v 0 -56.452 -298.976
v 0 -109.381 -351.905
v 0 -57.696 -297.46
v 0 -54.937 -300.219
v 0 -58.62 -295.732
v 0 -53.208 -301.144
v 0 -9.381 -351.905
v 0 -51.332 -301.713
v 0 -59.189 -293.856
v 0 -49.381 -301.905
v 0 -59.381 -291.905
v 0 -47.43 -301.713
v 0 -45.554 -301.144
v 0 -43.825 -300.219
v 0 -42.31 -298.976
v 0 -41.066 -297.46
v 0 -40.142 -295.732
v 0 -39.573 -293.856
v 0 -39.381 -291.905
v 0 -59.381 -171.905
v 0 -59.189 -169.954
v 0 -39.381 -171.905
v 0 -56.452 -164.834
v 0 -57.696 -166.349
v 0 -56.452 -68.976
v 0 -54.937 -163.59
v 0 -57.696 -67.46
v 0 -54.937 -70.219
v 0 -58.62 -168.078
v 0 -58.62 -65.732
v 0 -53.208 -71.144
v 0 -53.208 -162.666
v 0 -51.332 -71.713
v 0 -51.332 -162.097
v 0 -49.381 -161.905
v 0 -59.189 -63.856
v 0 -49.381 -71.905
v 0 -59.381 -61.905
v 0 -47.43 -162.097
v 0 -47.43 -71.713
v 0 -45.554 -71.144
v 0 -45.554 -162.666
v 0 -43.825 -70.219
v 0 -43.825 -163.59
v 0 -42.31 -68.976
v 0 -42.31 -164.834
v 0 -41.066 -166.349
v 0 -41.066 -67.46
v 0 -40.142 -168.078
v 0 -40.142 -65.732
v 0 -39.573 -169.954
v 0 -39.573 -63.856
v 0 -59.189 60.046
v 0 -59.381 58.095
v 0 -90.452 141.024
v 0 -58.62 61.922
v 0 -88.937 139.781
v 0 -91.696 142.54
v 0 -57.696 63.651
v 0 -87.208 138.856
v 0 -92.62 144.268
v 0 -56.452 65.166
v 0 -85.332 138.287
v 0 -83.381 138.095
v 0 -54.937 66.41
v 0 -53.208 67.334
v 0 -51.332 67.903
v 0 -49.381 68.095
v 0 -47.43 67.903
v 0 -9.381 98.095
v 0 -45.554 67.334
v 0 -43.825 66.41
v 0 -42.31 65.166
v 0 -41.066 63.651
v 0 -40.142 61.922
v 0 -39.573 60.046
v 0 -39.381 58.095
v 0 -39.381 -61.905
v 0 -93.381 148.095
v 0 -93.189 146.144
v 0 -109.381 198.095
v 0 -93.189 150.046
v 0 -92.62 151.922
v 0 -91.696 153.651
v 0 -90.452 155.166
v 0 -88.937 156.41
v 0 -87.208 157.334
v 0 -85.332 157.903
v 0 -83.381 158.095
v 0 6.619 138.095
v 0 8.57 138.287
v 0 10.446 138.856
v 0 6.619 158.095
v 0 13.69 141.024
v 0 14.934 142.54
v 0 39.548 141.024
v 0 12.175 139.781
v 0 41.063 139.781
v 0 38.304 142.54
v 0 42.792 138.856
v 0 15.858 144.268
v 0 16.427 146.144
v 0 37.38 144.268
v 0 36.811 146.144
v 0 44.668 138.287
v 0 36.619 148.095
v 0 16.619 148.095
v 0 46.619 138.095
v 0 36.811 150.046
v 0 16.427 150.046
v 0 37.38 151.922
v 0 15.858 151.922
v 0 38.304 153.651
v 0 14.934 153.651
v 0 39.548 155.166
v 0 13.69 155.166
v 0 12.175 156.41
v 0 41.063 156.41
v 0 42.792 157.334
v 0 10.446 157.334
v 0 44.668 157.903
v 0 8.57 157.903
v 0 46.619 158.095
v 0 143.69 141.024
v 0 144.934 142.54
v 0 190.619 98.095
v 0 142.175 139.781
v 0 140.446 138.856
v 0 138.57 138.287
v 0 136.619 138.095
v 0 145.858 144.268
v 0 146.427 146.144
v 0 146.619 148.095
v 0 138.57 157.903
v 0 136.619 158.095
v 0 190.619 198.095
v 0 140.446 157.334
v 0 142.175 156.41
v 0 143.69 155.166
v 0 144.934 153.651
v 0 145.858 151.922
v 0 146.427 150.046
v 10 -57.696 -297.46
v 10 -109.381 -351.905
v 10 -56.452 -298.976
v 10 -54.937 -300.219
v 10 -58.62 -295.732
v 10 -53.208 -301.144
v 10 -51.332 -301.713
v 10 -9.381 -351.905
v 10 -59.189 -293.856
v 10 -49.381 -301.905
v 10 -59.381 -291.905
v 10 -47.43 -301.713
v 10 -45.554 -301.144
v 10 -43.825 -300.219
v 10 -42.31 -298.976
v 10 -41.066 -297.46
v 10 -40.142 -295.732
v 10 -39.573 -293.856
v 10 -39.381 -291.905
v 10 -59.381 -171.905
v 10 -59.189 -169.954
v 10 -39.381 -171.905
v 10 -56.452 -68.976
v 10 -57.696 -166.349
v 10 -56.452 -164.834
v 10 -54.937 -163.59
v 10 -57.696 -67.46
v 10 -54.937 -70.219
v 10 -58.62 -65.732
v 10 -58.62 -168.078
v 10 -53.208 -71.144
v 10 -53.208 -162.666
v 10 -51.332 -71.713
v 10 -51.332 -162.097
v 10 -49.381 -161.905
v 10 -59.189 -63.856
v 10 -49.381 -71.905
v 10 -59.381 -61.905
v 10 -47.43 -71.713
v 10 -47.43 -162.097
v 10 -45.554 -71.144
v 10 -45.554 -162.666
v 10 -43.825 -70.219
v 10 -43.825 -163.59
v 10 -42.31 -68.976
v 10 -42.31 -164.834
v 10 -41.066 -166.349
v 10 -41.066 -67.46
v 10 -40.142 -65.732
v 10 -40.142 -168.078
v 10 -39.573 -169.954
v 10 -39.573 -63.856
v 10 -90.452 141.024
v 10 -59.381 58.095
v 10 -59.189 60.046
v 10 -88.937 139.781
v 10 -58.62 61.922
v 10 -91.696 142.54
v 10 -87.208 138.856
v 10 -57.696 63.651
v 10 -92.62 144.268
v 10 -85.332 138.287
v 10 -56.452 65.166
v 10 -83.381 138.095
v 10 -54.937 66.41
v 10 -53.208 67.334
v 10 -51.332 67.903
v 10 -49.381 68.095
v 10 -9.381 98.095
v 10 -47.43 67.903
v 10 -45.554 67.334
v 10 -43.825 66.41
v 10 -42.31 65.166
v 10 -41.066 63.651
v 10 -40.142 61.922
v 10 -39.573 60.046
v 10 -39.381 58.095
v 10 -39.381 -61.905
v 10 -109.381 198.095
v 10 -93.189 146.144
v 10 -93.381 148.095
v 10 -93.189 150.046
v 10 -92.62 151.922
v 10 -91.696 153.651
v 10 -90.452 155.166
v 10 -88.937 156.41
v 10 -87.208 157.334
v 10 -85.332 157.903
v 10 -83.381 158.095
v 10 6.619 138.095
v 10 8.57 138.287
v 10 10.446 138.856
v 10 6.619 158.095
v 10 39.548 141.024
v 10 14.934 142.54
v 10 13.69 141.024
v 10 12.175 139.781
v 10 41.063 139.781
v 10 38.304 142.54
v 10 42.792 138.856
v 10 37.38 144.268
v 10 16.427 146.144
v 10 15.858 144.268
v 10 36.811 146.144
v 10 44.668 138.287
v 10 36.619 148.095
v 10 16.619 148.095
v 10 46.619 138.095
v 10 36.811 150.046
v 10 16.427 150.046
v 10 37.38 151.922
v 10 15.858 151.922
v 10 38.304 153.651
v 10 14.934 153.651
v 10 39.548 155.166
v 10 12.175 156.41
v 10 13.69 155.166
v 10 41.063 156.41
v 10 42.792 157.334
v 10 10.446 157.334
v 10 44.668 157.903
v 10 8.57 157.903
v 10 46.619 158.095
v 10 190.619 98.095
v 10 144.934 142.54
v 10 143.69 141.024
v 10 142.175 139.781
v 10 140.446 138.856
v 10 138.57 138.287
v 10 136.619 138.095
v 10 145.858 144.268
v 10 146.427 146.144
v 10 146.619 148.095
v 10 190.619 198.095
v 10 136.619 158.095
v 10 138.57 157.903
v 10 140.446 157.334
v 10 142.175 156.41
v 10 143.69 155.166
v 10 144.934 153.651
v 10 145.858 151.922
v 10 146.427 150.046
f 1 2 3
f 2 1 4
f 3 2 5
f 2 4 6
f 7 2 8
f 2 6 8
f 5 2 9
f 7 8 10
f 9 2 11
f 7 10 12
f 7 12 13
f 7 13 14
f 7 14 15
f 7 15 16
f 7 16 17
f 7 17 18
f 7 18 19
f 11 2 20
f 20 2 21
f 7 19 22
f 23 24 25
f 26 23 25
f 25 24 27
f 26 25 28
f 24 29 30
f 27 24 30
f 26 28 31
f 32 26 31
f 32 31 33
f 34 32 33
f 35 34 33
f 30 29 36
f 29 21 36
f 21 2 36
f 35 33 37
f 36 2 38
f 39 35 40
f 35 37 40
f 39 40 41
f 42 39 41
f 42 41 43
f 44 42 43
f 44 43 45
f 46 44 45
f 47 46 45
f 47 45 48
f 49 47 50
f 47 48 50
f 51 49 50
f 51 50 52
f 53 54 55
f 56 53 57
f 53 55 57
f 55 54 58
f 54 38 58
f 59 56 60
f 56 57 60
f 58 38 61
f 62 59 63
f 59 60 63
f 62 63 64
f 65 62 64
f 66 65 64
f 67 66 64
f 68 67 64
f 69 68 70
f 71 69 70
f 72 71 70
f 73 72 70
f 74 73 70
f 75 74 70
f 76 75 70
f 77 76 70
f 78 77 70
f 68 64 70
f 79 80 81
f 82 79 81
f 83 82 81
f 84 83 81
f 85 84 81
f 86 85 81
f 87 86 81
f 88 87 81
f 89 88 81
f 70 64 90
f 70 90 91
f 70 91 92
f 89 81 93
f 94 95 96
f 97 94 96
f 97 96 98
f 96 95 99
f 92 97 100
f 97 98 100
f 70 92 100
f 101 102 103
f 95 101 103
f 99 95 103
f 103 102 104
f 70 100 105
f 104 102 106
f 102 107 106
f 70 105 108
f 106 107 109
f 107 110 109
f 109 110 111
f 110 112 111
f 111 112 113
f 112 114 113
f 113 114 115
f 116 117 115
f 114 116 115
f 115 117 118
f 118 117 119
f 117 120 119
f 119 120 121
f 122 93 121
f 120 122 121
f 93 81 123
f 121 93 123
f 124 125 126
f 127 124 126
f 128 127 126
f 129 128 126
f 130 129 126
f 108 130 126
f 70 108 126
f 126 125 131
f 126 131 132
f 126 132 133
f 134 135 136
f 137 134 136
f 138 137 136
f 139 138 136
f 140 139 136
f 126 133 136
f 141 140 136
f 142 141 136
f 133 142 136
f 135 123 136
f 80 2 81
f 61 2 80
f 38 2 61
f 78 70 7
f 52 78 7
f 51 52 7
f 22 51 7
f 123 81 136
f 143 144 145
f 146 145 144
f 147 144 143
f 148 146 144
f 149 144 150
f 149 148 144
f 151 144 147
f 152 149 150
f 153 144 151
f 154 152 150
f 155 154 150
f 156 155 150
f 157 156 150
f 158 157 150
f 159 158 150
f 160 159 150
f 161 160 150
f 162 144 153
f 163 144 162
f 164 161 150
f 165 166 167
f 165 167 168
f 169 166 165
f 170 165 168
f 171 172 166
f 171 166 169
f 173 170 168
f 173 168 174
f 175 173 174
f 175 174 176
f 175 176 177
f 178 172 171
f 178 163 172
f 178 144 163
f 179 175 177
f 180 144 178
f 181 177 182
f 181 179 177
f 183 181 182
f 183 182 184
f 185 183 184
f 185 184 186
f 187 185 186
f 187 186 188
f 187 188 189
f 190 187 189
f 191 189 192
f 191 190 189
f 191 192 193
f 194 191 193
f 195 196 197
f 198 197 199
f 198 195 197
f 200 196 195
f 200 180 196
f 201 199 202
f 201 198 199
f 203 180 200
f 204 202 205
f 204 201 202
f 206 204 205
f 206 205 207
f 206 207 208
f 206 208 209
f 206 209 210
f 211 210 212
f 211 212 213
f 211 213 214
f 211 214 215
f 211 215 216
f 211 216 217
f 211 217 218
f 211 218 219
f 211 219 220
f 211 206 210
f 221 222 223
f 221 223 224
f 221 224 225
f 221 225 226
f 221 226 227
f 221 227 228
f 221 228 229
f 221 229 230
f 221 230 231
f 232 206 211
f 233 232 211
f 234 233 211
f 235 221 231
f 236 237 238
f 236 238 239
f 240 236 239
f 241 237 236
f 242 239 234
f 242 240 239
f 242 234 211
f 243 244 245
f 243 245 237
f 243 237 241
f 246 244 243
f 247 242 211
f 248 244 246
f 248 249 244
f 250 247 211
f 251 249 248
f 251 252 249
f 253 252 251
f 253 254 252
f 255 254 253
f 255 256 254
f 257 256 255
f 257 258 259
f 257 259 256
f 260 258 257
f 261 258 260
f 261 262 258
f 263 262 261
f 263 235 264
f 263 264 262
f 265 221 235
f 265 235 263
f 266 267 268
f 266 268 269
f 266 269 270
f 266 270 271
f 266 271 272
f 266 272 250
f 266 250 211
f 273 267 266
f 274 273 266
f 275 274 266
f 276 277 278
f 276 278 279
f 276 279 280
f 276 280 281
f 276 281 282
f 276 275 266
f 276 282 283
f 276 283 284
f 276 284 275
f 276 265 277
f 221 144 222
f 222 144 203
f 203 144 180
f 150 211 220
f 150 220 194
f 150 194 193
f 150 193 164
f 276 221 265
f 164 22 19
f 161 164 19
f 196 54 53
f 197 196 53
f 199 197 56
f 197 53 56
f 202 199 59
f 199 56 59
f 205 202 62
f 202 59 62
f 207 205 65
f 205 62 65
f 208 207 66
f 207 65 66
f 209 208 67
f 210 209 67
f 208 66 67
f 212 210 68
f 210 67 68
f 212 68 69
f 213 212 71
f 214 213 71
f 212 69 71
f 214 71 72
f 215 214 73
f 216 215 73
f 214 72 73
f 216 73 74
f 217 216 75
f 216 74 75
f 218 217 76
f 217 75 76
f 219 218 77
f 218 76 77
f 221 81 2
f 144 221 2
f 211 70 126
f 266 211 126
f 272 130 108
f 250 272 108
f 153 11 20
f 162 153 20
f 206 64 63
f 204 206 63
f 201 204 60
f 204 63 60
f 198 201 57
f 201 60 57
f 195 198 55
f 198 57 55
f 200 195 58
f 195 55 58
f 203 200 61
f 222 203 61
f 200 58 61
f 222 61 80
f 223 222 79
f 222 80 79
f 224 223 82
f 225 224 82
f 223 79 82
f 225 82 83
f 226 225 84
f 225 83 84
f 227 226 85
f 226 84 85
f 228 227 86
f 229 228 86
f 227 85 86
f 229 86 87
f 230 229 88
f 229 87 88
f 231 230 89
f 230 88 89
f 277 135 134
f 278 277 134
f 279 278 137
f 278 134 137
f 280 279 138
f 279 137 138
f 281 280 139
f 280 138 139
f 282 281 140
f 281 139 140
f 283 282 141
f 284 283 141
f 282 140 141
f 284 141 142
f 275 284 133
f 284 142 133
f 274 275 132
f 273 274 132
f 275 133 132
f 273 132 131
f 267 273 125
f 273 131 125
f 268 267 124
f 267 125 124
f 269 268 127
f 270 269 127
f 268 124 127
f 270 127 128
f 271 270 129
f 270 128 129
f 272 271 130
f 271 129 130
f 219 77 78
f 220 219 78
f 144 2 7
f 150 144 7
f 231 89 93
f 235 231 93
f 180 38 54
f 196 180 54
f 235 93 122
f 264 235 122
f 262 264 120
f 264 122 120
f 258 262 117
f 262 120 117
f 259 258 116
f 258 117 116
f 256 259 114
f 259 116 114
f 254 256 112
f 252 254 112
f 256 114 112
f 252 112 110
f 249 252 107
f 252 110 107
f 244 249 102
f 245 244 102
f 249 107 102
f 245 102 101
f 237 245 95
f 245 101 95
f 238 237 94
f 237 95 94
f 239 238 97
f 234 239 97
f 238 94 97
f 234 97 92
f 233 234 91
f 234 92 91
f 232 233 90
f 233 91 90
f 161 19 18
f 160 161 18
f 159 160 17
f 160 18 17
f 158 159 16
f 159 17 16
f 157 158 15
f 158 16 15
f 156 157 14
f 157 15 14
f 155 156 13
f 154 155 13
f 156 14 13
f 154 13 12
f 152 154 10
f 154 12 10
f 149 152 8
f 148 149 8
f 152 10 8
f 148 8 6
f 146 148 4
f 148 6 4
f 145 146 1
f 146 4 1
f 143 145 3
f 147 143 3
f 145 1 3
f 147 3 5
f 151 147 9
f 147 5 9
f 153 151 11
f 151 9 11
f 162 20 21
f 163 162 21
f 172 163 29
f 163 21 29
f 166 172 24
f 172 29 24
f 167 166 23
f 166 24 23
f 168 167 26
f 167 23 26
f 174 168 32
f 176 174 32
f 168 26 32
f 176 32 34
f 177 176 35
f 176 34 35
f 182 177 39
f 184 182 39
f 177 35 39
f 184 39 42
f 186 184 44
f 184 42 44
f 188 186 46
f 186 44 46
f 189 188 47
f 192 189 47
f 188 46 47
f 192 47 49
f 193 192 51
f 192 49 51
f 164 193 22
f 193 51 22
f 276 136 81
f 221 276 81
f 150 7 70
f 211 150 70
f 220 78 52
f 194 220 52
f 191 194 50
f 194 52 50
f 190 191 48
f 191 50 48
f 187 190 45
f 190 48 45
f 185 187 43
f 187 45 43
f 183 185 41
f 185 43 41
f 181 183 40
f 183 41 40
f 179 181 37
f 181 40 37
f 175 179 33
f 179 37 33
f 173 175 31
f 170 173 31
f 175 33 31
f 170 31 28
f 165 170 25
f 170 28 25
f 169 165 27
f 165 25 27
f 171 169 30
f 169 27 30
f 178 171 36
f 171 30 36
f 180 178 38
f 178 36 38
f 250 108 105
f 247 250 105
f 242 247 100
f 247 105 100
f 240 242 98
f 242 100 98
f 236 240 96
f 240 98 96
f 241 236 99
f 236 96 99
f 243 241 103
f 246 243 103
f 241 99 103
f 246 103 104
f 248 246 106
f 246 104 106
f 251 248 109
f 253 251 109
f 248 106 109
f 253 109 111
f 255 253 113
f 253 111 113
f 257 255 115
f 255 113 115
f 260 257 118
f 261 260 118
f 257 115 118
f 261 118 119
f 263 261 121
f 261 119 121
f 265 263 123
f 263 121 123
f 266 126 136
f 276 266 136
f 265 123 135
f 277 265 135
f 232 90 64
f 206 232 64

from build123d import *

# Parameters (mm, degrees)
F1_DEPTH = 10


with BuildPart() as f1:
    # F0 (on Right) → F1 (new body)
    with BuildSketch(Plane.YZ):
        Polygon((-109.380952, 198.095238), (-109.380952, -351.904762), (-9.380952, -351.904762), (-9.380952, 98.095238), (190.619048, 98.095238), (190.619048, 198.095238), align=None)
        with BuildLine():
            Line((-59.380952, -291.904762), (-59.380952, -171.904762))
            ThreePointArc((-59.380952, -171.904762), (-49.380952, -161.904762), (-39.380952, -171.904762))
            Line((-39.380952, -171.904762), (-39.380952, -291.904762))
            ThreePointArc((-39.380952, -291.904762), (-49.380952, -301.904762), (-59.380952, -291.904762))
        make_face(mode=Mode.SUBTRACT)
        with BuildLine():
            Line((-39.380952, 58.095238), (-39.380952, -61.904762))
            ThreePointArc((-39.380952, -61.904762), (-49.380952, -71.904762), (-59.380952, -61.904762))
            Line((-59.380952, -61.904762), (-59.380952, 58.095238))
            ThreePointArc((-59.380952, 58.095238), (-49.380952, 68.095238), (-39.380952, 58.095238))
        make_face(mode=Mode.SUBTRACT)
        with BuildLine():
            Line((-83.380952, 158.095238), (6.619048, 158.095238))
            ThreePointArc((6.619048, 158.095238), (16.619048, 148.095238), (6.619048, 138.095238))
            Line((6.619048, 138.095238), (-83.380952, 138.095238))
            ThreePointArc((-83.380952, 138.095238), (-93.380952, 148.095238), (-83.380952, 158.095238))
        make_face(mode=Mode.SUBTRACT)
        with BuildLine():
            Line((136.619048, 138.095238), (46.619048, 138.095238))
            ThreePointArc((46.619048, 138.095238), (36.619048, 148.095238), (46.619048, 158.095238))
            Line((46.619048, 158.095238), (136.619048, 158.095238))
            ThreePointArc((136.619048, 158.095238), (146.619048, 148.095238), (136.619048, 138.095238))
        make_face(mode=Mode.SUBTRACT)
    extrude(amount=F1_DEPTH)


solid = f1.part
